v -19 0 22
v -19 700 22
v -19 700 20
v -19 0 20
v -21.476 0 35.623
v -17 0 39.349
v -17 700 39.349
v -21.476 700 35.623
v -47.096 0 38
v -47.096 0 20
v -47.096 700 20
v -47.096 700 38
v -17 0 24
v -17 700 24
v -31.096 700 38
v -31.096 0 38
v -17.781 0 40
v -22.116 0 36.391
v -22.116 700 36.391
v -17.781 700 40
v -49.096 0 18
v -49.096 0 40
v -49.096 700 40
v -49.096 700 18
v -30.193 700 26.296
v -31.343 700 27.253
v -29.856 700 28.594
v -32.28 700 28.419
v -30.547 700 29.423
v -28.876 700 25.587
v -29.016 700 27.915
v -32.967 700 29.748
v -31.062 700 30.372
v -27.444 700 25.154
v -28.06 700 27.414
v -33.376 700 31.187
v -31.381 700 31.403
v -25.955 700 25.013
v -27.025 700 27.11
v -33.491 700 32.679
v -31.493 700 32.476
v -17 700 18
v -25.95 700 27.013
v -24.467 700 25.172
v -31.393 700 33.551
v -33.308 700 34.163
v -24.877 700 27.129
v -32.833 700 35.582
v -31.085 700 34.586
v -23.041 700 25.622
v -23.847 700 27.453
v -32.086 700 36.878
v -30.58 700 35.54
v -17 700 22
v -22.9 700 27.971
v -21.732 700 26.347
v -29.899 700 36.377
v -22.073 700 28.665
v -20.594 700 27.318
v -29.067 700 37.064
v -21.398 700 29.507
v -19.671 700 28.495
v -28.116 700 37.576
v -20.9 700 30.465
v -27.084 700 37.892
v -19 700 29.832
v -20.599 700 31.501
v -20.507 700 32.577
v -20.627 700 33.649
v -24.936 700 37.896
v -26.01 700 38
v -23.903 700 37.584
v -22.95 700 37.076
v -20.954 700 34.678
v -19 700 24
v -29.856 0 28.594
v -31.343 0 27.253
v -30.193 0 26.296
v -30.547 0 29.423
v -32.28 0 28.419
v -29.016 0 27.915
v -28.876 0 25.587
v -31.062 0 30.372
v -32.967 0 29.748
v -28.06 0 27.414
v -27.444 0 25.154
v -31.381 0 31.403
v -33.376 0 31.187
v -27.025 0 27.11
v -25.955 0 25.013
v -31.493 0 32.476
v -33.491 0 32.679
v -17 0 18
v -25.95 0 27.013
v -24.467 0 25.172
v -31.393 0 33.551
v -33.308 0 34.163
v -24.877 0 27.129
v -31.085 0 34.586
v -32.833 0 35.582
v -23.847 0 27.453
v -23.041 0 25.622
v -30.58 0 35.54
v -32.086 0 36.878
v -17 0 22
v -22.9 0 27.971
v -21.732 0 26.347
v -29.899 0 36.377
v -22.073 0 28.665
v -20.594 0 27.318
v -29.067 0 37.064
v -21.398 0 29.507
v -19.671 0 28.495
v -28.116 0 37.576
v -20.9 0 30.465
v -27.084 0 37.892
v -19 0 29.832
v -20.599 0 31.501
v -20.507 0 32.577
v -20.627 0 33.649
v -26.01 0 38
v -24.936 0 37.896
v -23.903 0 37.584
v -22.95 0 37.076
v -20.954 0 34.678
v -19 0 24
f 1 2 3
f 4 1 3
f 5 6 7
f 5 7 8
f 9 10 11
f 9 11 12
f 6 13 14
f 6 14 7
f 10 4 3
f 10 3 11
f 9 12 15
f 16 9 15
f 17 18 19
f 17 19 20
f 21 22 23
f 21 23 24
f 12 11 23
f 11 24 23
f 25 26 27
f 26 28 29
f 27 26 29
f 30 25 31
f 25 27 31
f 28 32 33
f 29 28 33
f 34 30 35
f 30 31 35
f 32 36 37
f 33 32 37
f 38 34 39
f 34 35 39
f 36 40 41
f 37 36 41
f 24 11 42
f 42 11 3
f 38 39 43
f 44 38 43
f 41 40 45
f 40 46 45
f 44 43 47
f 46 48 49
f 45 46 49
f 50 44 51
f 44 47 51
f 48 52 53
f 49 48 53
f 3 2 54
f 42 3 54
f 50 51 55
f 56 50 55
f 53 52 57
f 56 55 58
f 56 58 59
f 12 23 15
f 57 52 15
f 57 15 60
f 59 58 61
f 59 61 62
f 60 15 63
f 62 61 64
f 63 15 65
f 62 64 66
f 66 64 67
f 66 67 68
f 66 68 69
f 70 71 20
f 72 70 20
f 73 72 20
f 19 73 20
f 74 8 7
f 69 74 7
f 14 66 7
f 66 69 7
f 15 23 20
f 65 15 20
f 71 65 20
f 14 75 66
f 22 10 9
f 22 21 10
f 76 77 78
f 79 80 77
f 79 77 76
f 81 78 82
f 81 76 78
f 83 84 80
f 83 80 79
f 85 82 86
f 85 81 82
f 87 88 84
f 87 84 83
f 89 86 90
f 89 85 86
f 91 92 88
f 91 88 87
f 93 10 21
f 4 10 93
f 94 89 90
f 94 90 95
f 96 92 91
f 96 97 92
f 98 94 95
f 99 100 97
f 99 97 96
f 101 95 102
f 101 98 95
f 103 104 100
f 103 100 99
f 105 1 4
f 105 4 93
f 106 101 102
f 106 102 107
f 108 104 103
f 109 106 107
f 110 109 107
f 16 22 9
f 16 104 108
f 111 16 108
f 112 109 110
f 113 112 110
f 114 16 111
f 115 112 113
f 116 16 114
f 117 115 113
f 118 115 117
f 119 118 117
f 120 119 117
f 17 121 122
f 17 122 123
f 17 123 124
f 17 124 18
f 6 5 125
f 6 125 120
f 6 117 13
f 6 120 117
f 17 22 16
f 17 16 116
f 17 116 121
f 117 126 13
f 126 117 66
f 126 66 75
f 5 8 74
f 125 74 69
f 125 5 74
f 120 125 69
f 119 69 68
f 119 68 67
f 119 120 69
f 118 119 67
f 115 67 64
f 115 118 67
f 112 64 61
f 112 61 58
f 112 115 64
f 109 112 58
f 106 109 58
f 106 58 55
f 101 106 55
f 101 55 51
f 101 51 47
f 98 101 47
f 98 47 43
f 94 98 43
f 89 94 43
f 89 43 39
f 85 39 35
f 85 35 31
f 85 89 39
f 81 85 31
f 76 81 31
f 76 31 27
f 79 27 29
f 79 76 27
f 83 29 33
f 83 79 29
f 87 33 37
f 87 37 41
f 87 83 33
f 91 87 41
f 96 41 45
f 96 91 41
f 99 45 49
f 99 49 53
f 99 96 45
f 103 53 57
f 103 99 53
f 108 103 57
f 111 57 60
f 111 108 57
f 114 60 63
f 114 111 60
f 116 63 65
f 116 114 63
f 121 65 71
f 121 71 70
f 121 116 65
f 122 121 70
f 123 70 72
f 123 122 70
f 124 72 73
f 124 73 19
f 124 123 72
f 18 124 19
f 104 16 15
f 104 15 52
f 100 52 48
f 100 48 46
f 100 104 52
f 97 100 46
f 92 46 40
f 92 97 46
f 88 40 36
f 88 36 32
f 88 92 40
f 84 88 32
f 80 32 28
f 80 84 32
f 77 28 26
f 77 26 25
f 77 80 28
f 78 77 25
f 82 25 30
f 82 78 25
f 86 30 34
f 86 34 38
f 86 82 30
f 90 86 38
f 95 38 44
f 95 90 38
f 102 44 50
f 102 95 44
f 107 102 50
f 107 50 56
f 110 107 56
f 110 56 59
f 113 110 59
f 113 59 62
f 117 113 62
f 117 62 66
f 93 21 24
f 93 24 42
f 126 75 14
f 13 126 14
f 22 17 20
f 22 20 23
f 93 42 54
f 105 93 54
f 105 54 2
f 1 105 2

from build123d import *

# Parameters (mm, degrees)
F2_DEPTH = 1910
F7_DEPTH = 700
F9_DEPTH = 2000


with BuildPart() as f2:
    # F1 (on Front) → F2 (new body)
    with BuildSketch(Plane.XZ):
        with BuildLine():
            Line((7.5, 37.974085065), (7.5, 40))
            Line((7.5, 40), (-15, 40))
            Line((-15, 40), (-15, 37))
            Line((-15, 37), (-15, 31))
            Line((-15, 31), (-15, 29))
            Line((-15, 29), (-15, 26))
            Line((-15, 26), (-15, 24))
            Line((-15, 24), (-13, 24))
            Line((-13, 24), (-11, 24))
            Line((-11, 24), (-11, 26))
            Line((-11, 26), (-9, 26))
            Line((-9, 26), (-9, 20))
            Line((-9, 20), (-11, 20))
            Line((-11, 20), (-11, 22))
            Line((-11, 22), (-15, 22))
            Line((-15, 22), (-15, 18))
            Line((-15, 18), (-15, 7.7))
            Line((-15, 7.7), (-13, 7.7))
            Line((-13, 7.7), (-13, 11.4920835048))
            Line((-13, 11.4920835048), (-7, 11.4920835048))
            Line((-7, 11.4920835048), (-7, 3.7))
            Line((-7, 3.7), (-11, 3.7))
            Line((-11, 3.7), (-11, 5.7))
            Line((-11, 5.7), (-15, 5.7))
            Line((-15, 5.7), (-15, 3))
            Line((-15, 3), (-15, 0))
            Line((-15, 0), (-13, 0))
            Line((-13, 0), (-12, 0))
            Line((-12, 0), (-5, 0))
            Line((-5, 0), (-5, 13.4920835048))
            Line((-5, 13.4920835048), (-7, 13.4920835048))
            Line((-7, 13.4920835048), (-9.1588944197, 13.4920835048))
            Line((-9.1588944197, 13.4920835048), (-9.1588944197, 15.4920835048))
            Line((-9.1588944197, 15.4920835048), (1.5, 20))
            Line((1.5, 20), (10.8411055803, 15.4920835048))
            Line((10.8411055803, 15.4920835048), (10.8411055803, 13.4920835048))
            Line((10.8411055803, 13.4920835048), (8, 13.4920835048))
            Line((8, 13.4920835048), (8, 0))
            Line((8, 0), (17, 0))
            Line((17, 0), (17, 40))
            Line((17, 40), (8.5, 40))
            Line((8.5, 40), (8.5, 37.974085065))
            ThreePointArc((8.5, 37.974085065), (11.5604089792, 36.6859489396), (13.3185590744, 33.8691589154))
            Line((13.3185590744, 33.8691589154), (13.4318527537, 31.7073867348))
            ThreePointArc((13.4318527537, 31.7073867348), (4.0126863822, 28.7323088758), (7.5, 37.974085065))
        make_face()
        Polygon((-8.3634709733, 18), (-11.1588944197, 16.817744602), (-11.1588944197, 15.4920835048), (-11.1588944197, 13.4920835048), (-13, 13.4920835048), (-13, 18), align=None, mode=Mode.SUBTRACT)
        with BuildLine():
            Line((-13, 34), (-13, 37.9999987781))
            Line((-13, 37.9999987781), (2.9081163149, 37.9999987781))
            ThreePointArc((2.9081163149, 37.9999987781), (3.810445381, 26.2974906682), (15, 29.8410427327))
            Line((15, 29.8410427327), (15, 2))
            Line((15, 2), (10, 2))
            Line((10, 2), (10, 12))
            Line((10, 12), (12.8411055803, 12))
            Line((12.8411055803, 12), (12.8411055803, 16.7476188273))
            Line((12.8411055803, 16.7476188273), (1.5543358685, 22.194491783))
            Line((1.5543358685, 22.194491783), (-7, 18.5766464184))
            Line((-7, 18.5766464184), (-7, 28))
            Line((-7, 28), (-13, 28))
            Line((-13, 28), (-13, 34))
        make_face(mode=Mode.SUBTRACT)
        with BuildLine():
            Line((13.0918836851, 37.9999987781), (13.1020709306, 37.9999987781))
            Line((13.1020709306, 37.9999987781), (13.1025921338, 37.9900536295))
            ThreePointArc((13.1025921338, 37.9900536295), (13.0972403349, 37.9950288154), (13.0918836851, 37.9999987781))
        make_face(mode=Mode.SUBTRACT)
    extrude(amount=-F2_DEPTH)

    # F8 (on face) → F9 (cut)
    with BuildSketch(Plane.XZ):
        Polygon((17, 0), (17, 40), (-15, 40), (-15, 3), (-15, 0), align=None)
    extrude(amount=-F9_DEPTH, mode=Mode.SUBTRACT)


with BuildPart() as f7:
    # F6 (on face) → F7 (new body)
    with BuildSketch(Plane.XZ):
        with BuildLine():
            Line((-17.7814291848, 40), (-25.5, 40))
            Line((-25.5, 40), (-49.096, 40))
            Line((-49.096, 40), (-49.096, 18))
            Line((-49.096, 18), (-17, 18))
            Line((-17, 18), (-17, 22))
            Line((-17, 22), (-19, 22))
            Line((-19, 22), (-19, 20))
            Line((-19, 20), (-47.096, 20))
            Line((-47.096, 20), (-47.096, 38))
            Line((-47.096, 38), (-31.0964418097, 38))
            ThreePointArc((-31.0964418097, 38), (-30.1932729017, 26.2962600635), (-19, 29.8323432536))
            Line((-19, 29.8323432536), (-19, 24))
            Line((-19, 24), (-17, 24))
            Line((-17, 24), (-17, 39.349379475))
            Line((-17, 39.349379475), (-21.4759115093, 35.6227207421))
            ThreePointArc((-21.4759115093, 35.6227207421), (-30.2216849679, 28.9915813466), (-22.1157647548, 36.3912178626))
            Line((-22.1157647548, 36.3912178626), (-17.7814291848, 40))
        make_face()
    extrude(amount=-F7_DEPTH)


solid = f7.part
